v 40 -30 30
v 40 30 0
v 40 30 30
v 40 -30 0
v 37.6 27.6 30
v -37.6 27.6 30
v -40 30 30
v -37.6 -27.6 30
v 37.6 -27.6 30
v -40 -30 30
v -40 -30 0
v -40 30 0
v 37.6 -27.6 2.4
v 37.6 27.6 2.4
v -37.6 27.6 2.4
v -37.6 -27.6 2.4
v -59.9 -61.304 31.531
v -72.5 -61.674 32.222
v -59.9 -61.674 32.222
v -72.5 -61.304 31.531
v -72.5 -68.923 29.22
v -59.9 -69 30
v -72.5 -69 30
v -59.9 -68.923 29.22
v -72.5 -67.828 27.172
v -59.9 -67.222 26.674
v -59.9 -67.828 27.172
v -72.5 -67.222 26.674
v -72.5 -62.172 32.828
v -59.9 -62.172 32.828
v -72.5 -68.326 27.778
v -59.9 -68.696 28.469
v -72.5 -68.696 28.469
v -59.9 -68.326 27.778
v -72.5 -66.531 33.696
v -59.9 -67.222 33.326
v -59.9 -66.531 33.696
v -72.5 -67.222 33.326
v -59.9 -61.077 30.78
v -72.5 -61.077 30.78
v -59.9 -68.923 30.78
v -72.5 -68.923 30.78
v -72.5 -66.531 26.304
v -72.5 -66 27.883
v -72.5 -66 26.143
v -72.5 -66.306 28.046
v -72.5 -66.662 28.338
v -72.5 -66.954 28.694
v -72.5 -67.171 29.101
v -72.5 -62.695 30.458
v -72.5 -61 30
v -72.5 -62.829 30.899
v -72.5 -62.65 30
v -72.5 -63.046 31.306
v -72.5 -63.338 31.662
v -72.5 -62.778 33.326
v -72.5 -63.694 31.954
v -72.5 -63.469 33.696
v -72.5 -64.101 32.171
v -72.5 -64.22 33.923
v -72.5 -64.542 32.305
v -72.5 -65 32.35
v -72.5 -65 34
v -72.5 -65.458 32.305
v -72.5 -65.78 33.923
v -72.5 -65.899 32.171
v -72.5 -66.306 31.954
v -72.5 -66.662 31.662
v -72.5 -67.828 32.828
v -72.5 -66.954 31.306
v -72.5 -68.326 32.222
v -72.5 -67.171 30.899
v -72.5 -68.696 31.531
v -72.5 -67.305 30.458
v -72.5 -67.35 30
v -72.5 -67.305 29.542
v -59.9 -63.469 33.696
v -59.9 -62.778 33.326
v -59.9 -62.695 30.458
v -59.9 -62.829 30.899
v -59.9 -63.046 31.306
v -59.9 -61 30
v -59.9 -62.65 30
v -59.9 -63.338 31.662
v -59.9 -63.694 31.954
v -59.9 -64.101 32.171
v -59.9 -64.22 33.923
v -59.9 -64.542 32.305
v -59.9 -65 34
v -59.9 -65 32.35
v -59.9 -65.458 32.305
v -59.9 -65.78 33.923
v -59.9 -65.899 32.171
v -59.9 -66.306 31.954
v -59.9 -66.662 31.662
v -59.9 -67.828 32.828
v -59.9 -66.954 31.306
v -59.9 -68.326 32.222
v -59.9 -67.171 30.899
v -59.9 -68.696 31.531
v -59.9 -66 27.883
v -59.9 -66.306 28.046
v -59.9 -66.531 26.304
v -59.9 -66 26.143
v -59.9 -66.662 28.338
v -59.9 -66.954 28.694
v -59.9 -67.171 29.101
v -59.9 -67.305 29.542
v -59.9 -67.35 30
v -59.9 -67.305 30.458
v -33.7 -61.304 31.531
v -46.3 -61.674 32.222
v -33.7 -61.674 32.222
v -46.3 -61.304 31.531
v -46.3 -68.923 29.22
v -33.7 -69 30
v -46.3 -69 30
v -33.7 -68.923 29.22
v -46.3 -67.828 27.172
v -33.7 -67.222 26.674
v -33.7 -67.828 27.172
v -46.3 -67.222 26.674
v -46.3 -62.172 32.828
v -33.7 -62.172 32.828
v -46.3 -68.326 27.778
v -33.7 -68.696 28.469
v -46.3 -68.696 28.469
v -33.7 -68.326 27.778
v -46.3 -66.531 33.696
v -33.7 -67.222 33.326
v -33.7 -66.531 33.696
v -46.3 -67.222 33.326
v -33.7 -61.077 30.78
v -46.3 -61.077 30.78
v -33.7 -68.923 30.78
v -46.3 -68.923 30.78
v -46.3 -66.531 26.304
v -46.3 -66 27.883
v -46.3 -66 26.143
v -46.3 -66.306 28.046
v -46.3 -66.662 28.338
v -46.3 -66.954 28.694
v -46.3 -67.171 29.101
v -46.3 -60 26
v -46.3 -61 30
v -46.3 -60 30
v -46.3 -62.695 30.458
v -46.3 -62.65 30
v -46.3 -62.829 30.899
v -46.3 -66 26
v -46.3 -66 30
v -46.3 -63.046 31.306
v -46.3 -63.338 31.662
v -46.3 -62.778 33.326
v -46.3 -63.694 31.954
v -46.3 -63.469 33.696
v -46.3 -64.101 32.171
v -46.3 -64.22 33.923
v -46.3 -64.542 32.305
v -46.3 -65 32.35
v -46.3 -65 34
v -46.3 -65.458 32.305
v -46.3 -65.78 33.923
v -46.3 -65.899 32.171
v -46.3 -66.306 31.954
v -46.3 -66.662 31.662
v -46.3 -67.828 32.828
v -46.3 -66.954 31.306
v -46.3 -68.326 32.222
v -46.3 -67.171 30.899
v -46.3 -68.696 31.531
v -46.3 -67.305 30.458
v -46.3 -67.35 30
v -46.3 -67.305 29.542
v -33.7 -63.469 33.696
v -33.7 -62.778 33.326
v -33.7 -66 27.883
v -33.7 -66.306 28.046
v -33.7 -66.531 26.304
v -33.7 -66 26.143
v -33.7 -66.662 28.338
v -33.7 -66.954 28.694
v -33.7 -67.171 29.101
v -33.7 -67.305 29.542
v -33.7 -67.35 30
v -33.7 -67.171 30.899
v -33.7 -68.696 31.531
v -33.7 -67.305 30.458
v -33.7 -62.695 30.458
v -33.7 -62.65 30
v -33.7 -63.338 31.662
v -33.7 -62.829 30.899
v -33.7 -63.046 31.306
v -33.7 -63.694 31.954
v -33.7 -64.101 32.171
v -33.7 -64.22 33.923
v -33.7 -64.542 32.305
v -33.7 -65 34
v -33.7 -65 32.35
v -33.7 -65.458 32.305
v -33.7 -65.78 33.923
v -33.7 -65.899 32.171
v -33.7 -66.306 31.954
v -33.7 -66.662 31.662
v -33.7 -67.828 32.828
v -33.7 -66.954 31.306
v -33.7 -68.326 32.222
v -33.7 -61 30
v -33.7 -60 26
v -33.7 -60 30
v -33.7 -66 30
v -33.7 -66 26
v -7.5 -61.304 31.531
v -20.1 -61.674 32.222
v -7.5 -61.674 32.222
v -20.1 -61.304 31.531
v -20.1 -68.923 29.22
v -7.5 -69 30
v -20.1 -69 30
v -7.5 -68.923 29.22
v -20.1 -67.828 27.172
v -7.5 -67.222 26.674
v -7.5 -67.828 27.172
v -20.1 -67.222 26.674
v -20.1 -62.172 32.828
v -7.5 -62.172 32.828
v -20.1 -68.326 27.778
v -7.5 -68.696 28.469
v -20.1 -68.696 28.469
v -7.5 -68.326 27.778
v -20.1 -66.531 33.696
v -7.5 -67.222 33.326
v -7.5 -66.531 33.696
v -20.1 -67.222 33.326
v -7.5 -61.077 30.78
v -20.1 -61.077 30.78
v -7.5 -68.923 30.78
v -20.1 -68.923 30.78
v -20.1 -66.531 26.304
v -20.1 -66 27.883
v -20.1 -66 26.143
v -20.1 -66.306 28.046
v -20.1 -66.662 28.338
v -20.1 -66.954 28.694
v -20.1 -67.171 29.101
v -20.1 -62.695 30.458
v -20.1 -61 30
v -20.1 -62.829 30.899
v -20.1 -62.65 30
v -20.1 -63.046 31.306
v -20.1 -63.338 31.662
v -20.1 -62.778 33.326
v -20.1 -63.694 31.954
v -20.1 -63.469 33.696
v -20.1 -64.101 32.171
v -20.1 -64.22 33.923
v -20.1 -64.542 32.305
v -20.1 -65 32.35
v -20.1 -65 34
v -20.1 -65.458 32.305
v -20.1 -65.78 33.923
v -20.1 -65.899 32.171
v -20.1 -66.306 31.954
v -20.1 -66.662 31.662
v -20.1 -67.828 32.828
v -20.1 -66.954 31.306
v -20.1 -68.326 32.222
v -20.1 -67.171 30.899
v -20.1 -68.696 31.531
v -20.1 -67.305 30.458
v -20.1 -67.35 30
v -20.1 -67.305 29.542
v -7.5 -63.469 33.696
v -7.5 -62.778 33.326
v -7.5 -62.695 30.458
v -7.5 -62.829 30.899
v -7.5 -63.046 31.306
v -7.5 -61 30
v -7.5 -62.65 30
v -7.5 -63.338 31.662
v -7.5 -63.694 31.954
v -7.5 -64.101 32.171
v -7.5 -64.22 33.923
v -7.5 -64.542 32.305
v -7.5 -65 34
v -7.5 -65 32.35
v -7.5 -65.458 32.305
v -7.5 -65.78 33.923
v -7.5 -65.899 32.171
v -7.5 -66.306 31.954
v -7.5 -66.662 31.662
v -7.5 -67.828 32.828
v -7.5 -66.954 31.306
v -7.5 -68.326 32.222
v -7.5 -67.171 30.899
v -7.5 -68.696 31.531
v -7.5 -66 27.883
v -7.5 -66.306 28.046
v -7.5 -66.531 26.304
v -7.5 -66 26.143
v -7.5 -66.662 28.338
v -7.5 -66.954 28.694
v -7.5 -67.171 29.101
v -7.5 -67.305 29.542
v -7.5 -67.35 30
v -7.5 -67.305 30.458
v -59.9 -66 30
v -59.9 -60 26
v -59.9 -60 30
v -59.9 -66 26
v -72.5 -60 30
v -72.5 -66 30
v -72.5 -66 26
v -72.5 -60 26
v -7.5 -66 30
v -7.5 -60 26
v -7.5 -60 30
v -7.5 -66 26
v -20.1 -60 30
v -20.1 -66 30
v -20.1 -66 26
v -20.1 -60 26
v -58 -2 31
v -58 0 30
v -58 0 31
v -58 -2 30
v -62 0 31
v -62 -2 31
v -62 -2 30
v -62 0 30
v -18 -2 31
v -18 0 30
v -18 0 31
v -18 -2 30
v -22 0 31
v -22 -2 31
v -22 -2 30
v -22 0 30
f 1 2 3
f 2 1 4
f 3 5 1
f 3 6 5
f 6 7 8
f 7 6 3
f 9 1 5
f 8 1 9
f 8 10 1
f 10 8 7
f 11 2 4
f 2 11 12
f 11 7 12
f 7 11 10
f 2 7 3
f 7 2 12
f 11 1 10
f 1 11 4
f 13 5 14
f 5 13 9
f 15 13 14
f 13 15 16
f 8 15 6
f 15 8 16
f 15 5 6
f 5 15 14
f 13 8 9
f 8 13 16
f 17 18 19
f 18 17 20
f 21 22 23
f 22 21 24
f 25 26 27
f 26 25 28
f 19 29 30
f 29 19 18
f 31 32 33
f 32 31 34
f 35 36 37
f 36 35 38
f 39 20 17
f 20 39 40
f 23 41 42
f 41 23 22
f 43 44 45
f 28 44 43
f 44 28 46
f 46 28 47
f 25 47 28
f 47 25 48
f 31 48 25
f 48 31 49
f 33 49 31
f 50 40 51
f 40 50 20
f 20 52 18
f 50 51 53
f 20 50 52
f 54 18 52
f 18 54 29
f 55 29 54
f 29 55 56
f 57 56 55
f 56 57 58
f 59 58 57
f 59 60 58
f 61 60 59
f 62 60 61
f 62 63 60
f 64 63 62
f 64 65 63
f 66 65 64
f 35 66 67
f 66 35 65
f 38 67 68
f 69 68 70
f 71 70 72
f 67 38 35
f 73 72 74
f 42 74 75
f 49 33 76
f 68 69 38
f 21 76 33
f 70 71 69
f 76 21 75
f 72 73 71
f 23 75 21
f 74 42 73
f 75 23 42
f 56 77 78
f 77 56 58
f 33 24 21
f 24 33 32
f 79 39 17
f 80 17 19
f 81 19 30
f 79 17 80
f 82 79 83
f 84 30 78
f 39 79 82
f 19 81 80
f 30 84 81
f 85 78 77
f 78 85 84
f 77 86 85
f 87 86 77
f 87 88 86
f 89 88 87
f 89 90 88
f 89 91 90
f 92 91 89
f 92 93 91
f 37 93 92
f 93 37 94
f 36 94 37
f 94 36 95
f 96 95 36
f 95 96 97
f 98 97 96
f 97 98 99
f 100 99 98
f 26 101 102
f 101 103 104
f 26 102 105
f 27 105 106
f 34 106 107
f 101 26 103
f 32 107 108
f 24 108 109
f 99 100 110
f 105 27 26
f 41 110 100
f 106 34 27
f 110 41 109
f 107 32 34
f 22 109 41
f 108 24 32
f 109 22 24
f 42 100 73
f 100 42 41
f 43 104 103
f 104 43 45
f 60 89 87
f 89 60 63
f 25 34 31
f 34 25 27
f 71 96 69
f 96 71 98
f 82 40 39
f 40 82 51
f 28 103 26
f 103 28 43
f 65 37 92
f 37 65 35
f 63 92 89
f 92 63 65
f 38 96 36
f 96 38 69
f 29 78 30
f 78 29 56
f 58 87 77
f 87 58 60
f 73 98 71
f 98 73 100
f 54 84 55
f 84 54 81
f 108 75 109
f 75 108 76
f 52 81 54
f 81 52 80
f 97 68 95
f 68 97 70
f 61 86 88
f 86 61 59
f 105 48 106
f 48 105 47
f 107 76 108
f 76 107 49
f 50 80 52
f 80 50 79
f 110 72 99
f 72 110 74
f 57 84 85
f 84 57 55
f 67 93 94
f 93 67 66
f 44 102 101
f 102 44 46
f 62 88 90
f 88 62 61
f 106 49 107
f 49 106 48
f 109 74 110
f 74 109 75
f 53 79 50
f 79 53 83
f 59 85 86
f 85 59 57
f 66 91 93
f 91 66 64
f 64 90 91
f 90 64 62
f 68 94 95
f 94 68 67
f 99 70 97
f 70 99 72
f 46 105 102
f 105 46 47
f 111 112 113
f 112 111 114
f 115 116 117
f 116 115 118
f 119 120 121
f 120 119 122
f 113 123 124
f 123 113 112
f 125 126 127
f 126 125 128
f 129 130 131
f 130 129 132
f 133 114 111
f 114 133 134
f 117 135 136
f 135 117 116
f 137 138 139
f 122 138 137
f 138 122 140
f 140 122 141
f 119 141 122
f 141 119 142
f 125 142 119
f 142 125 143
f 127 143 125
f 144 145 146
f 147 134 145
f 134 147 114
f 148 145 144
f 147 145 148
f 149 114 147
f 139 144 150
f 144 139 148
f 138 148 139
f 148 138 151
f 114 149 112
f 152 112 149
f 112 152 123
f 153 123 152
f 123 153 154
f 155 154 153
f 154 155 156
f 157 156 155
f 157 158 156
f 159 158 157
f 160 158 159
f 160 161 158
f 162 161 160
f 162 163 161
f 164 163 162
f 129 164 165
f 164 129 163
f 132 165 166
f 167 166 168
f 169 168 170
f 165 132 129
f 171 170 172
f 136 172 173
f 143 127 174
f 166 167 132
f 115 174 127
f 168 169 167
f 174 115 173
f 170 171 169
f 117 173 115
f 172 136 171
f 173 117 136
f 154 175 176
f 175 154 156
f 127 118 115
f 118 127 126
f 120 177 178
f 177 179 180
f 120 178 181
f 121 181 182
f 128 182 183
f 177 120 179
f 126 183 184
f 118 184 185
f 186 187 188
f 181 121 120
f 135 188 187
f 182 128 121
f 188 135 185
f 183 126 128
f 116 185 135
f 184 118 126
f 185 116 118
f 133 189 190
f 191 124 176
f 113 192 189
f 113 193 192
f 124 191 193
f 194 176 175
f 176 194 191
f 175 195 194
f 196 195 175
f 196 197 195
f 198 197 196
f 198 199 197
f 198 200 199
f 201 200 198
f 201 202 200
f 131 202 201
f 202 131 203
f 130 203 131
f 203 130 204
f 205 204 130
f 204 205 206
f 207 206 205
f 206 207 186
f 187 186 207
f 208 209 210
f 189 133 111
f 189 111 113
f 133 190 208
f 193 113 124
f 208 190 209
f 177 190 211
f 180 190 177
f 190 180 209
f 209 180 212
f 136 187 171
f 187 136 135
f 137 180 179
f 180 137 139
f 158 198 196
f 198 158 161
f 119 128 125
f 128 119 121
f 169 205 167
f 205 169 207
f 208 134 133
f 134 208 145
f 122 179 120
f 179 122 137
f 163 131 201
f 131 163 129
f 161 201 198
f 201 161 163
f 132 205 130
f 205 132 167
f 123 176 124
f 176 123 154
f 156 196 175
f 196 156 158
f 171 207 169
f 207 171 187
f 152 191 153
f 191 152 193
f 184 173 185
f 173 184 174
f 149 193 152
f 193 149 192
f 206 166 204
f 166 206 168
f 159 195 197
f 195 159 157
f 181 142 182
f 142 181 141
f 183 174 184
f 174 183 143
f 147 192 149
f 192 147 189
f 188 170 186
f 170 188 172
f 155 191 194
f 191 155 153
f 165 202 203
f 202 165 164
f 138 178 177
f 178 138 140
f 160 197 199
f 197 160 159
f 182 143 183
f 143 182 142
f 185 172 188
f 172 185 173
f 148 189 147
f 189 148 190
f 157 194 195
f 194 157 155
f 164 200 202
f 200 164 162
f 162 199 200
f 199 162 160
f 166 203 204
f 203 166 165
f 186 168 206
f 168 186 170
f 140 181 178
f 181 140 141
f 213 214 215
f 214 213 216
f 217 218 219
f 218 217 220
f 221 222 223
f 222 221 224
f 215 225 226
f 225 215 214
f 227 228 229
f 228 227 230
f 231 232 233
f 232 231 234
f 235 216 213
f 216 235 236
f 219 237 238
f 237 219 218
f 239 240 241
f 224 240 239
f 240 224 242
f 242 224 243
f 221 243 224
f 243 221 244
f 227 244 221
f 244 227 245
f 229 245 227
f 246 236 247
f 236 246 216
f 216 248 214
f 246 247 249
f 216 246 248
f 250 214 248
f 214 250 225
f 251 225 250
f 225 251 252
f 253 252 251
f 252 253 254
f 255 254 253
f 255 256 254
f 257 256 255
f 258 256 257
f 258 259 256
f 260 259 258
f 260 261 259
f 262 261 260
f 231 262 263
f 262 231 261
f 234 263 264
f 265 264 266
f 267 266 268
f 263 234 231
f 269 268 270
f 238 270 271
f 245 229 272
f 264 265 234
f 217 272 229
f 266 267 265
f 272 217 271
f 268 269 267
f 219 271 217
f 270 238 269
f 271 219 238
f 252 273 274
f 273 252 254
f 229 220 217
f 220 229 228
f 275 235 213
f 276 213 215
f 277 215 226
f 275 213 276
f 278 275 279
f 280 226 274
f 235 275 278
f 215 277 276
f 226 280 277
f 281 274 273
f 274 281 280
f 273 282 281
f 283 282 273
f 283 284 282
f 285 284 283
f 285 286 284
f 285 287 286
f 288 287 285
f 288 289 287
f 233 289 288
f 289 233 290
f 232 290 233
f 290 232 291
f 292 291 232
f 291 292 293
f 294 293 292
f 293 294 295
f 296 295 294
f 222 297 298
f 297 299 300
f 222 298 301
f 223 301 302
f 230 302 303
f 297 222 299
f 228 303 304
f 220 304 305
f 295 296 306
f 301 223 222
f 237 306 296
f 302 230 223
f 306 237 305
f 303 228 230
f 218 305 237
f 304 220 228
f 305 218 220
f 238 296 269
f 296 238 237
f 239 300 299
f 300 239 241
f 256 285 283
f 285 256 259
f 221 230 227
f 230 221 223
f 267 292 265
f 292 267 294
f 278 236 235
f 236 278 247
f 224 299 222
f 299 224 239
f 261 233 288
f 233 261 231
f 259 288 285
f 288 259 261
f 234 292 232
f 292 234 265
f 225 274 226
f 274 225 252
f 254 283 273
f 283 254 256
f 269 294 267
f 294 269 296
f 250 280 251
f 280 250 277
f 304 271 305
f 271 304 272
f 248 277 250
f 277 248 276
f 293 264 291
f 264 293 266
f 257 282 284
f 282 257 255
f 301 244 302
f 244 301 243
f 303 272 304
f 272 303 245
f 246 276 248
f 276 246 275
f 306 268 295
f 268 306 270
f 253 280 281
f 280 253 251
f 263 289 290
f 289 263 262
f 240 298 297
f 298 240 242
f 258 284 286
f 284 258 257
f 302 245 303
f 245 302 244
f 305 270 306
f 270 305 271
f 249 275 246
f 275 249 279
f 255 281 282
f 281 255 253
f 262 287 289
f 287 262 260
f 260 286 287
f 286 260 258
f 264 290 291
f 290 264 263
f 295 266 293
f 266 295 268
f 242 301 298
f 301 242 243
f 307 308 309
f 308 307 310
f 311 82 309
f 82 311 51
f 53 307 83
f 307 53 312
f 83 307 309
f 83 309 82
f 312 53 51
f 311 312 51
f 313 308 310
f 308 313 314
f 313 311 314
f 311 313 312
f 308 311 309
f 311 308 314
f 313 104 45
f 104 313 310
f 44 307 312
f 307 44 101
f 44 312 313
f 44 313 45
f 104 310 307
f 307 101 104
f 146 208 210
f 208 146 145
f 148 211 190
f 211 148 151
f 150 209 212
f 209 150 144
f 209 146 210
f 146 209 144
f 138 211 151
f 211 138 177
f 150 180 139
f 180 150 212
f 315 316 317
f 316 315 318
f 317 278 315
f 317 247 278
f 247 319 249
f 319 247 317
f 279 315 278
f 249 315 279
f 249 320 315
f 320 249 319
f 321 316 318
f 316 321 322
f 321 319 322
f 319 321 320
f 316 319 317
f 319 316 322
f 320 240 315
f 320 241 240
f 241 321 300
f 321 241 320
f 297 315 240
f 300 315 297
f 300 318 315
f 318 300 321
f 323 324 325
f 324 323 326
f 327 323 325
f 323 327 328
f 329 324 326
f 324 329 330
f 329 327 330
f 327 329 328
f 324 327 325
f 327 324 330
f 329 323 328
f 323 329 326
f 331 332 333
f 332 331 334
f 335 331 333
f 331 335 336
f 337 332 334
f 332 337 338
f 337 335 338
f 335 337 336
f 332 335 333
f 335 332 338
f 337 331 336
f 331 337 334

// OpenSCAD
// Print-in-hand hinged box 80x60x40 (hinge knuckles protrude 9 at back).
// Parts print separately in one job, no supports; pin slides in, caps press on.
// Assembly shown closed; lid swings 0..110 deg about X axis at (y=-35,z=30).
part = "box";
$fn = 32;

W=80; D=60; Hb=30; GAP=0.4; HL=9.6;
WT=2.4; FT=2.4;
AXY=-35; AXZ=30; KR=4; BR=2.35; KL=12.6; PITCH=13.1;
BOXC=[-26.2,0,26.2]; LIDC=[-13.1,13.1];
SKT=26;                    // skirt/knuckle Bauteil-Unterkante (Druck)
PIN_R=2; PIN_L=67.5; CAP_R=3; CAP_HOLE=1.85; CAP_T=2;

cadverify_only = "";
module instance(name, part, unit = 1) {
    echo(cadverify_instance = [name, part, unit]);
    if (cadverify_only == "" || cadverify_only == name) children();
}

module knuckle(cx, ay, az) {
    translate([cx, ay, az]) rotate([0,90,0])
        difference() {
            cylinder(r=KR, h=KL, center=true);
            cylinder(r=BR, h=KL+0.4, center=true);
        }
}
module webbox(cx) translate([cx-KL/2, -36, 26]) cube([KL, 6, 4]);
module webblid(cx) translate([cx-KL/2, -36, 26]) cube([KL, 6, 4.4]);

module box_part() {
    difference() {
        union() {
            difference() {
                cube([W, D, Hb]);
                translate([WT, WT, FT]) cube([W-2*WT, D-2*WT, Hb]);
            }
            for (cx=BOXC) { knuckle(cx, AXY, AXZ); webbox(cx); }
            for (nx=[-20,20]) translate([nx-2, 28, 30]) cube([4, 2, 1]);
        }
    }
}

module lid_part() {
    // printed upside down: slab on bed, skirt up, notch pits open upward
    difference() {
        union() {
            translate([-40, -29.6, 0]) cube([80, 59.6, HL]);
            // skirt walls (outer 74.2 x 54.2, 2 thick), z 9.6..14
            translate([-37.1, -27.1, 9.6]) cube([74.2, 2, 4.4]);
            translate([-37.1, 25.1, 9.6]) cube([74.2, 2, 4.4]);
            translate([-37.1, -27.1, 9.6]) cube([2, 54.2, 4.4]);
            translate([35.1, -27.1, 9.6]) cube([2, 54.2, 4.4]);
            for (cx=LIDC) { knuckle(cx, AXY, 10); webblid(cx);
                translate([cx-KL/2, -30, 9.6]) cube([KL, 0.4, 0.8]); }
        }
        for (nx=[-20,20]) translate([nx-2.4, 27.6, 8.5]) cube([4.8, 2.4, 1.2]);
    }
}

module pin_part() cylinder(r=PIN_R, h=PIN_L);
module cap_part() difference() {
    cylinder(r=CAP_R, h=CAP_T);
    translate([0,0,-0.2]) cylinder(r=CAP_HOLE, h=CAP_T+0.4);
}

if (part == "box") {
    echo(cadverify_spec = [
        ["bounds", [[-40, -39, 0], [40, 30, 34]]],
        ["bodies", 1], ["through_holes", 3],
        ["support_faces", [["base", "-z", 4000]]],
        ["overhangs_allowed", [["hinge knuckles and bores, bridges to 4.7",
            [[-33, -39, 25.5], [33, -31, 34.5]]]]],
        ["copies", 1],
        ["details", [
            ["wall", "thickness", [0, 32, 15], [0, -1, 0], 2.4],
            ["floor", "thickness", [0, 0, -1], [0, 0, 1], 2.4],
            ["knuckle", "material", [[-6.3, -39, 26], [6.3, -31, 34]], 0.3],
            ["bore", "hole", [8, -35, 30], [-1, 0, 0], [[0, 4.7], [12.6, 4.7]]],
            ["nub", "material", [[18, 28, 30], [22, 30, 31]], 0.9]
        ]]
    ]);
    translate([-40, -30, 0]) box_part();
}
if (part == "lid") {
    echo(cadverify_spec = [
        ["bounds", [[-40, -39, 0], [40, 30, 14]]],
        ["bodies", 1], ["through_holes", 2],
        ["support_faces", [["top", "-z", 4000]]],
        ["overhangs_allowed", [["hinge knuckle undersides and bore roofs, bridges to 4.7",
            [[-33, -39, 6], [33, -31, 14]]]]],
        ["copies", 1],
        ["details", [
            ["top", "thickness", [0, 0, 15], [0, 0, -1], 9.6],
            ["knuckle", "material", [[-19.4, -39, 6], [-6.8, -31, 14]], 0.3],
            ["bore", "hole", [-4, -35, 10], [-1, 0, 0], [[0, 4.7], [12.6, 4.7]]],
            ["notch", "void", [[17.6, 27.6, 8.4], [22.4, 30, 9.7]], 0.8]
        ]]
    ]);
    translate([0, 0, 0]) lid_part();
}
if (part == "pin") {
    echo(cadverify_spec = [
        ["bounds", [[-2, -2, 0], [2, 2, 67.5]]],
        ["bodies", 1], ["through_holes", 0],
        ["support_faces", [["base", "-z", 8]]],
        ["copies", 1],
        ["details", [
            ["shaft", "thickness", [3, 0, 30], [-1, 0, 0], 4]
        ]]
    ]);
    pin_part();
}
if (part == "cap") {
    echo(cadverify_spec = [
        ["bounds", [[-3, -3, 0], [3, 3, 2]]],
        ["bodies", 1], ["through_holes", 1],
        ["support_faces", [["base", "-z", 12]]],
        ["copies", 2],
        ["details", [
            ["ring", "thickness", [2.4, 0, 3], [0, 0, -1], 2]
        ]]
    ]);
    cap_part();
}
if (part == "assembly") {
    echo(cadverify_spec = [
        ["bounds", [[-40, -39, 0], [40, 30, 40]]],
        ["support_faces", [["bed", "-z", 4000]]],
        ["allowed_interferences", [["cap_plus", "pin", "cap bore press fit 0.15"],
            ["cap_minus", "pin", "cap bore press fit 0.15"]]],
        ["motions", [
            ["lid_swing", ["lid"], "rotate", [0, -35, 30], [1, 0, 0], [0, 110]]
        ]],
        ["assembly_order", [
            [["box"]],
            [["lid"], [0, 0, -1]],
            [["pin"], [-1, 0, 0]],
            [["cap_plus"], [-1, 0, 0]],
            [["cap_minus"], [1, 0, 0]]
        ]]
    ]);
    instance("box", "box") translate([-40, -30, 0]) box_part();
    instance("lid", "lid") translate([0, 0, 40]) rotate([0, 0, 180]) rotate([180, 0, 0]) lid_part();
    instance("pin", "pin") translate([-33.75, -35, 30]) rotate([0, 90, 0]) pin_part();
    instance("cap_plus", "cap") translate([32.7, -35, 30]) rotate([0, 90, 0]) cap_part();
    instance("cap_minus", "cap") translate([-32.7, -35, 30]) rotate([0, -90, 0]) cap_part();
}
